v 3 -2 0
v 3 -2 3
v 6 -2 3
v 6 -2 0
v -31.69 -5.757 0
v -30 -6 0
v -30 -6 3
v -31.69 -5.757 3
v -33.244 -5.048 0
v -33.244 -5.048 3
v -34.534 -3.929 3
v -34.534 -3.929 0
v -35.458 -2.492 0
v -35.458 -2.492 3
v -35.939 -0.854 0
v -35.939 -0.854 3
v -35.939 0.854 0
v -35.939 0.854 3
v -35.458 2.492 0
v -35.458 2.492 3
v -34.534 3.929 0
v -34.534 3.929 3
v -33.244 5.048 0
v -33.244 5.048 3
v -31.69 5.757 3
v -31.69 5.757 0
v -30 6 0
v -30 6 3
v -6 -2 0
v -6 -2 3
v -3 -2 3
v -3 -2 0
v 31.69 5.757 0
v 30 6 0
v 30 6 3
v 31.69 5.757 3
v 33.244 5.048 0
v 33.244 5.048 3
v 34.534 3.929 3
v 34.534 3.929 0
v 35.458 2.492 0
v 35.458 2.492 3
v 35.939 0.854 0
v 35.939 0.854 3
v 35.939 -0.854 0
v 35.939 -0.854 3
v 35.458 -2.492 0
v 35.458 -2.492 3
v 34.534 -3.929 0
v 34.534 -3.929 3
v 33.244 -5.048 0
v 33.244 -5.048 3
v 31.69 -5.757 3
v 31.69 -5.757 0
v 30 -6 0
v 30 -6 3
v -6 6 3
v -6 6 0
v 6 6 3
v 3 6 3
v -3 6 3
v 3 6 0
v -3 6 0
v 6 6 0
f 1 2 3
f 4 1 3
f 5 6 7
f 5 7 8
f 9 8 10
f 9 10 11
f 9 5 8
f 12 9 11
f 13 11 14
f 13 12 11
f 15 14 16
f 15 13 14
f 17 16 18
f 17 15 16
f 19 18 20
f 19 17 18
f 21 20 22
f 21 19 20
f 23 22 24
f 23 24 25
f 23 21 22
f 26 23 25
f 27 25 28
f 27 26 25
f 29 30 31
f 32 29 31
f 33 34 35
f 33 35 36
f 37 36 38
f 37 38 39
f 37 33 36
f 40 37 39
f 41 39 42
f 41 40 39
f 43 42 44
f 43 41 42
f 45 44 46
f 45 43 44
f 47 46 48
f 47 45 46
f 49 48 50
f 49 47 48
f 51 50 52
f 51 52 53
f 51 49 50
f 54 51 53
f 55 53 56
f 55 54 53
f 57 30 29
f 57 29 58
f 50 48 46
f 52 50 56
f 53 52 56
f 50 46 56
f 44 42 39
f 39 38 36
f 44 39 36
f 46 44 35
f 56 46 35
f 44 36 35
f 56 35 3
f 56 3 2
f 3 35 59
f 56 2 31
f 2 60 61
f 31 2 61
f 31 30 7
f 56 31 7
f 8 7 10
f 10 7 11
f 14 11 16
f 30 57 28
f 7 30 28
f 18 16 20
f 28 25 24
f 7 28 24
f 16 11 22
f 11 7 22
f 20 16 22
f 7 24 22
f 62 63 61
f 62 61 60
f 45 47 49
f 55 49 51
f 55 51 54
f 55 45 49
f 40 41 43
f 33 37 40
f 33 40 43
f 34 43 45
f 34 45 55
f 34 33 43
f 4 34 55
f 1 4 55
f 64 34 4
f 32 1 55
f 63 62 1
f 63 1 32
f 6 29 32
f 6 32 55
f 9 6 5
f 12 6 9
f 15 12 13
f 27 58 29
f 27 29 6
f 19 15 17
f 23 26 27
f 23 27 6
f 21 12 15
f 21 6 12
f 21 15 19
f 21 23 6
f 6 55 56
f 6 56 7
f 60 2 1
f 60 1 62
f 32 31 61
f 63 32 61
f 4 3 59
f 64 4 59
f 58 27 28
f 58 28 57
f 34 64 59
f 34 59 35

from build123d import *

# Parameters (mm, degrees)
EXTRUDE_1_DEPTH     = 3
SKETCH_2_W          = 3
SKETCH_2_H          = 8
CUT_EXTRUDE_1_DEPTH = 4


with BuildPart() as part:
    # 草图1 → 凸台-拉伸1 (new body)
    with BuildSketch(Plane.XY):
        with BuildLine():
            Line((30, -6), (-30, -6))
            ThreePointArc((-30, -6), (-36, 0), (-30, 6))
            Line((-30, 6), (30, 6))
            ThreePointArc((30, 6), (36, 0), (30, -6))
        make_face()
    extrude(amount=EXTRUDE_1_DEPTH)

    # 草图2 → 切除-拉伸1 (cut)
    with BuildSketch(Plane.XY.offset(3)):
        with Locations((-4.5, 2)):
            Rectangle(SKETCH_2_W, SKETCH_2_H)
        with Locations((4.5, 2)):
            Rectangle(SKETCH_2_W, SKETCH_2_H)
    extrude(amount=-CUT_EXTRUDE_1_DEPTH, mode=Mode.SUBTRACT)


solid = part.part
